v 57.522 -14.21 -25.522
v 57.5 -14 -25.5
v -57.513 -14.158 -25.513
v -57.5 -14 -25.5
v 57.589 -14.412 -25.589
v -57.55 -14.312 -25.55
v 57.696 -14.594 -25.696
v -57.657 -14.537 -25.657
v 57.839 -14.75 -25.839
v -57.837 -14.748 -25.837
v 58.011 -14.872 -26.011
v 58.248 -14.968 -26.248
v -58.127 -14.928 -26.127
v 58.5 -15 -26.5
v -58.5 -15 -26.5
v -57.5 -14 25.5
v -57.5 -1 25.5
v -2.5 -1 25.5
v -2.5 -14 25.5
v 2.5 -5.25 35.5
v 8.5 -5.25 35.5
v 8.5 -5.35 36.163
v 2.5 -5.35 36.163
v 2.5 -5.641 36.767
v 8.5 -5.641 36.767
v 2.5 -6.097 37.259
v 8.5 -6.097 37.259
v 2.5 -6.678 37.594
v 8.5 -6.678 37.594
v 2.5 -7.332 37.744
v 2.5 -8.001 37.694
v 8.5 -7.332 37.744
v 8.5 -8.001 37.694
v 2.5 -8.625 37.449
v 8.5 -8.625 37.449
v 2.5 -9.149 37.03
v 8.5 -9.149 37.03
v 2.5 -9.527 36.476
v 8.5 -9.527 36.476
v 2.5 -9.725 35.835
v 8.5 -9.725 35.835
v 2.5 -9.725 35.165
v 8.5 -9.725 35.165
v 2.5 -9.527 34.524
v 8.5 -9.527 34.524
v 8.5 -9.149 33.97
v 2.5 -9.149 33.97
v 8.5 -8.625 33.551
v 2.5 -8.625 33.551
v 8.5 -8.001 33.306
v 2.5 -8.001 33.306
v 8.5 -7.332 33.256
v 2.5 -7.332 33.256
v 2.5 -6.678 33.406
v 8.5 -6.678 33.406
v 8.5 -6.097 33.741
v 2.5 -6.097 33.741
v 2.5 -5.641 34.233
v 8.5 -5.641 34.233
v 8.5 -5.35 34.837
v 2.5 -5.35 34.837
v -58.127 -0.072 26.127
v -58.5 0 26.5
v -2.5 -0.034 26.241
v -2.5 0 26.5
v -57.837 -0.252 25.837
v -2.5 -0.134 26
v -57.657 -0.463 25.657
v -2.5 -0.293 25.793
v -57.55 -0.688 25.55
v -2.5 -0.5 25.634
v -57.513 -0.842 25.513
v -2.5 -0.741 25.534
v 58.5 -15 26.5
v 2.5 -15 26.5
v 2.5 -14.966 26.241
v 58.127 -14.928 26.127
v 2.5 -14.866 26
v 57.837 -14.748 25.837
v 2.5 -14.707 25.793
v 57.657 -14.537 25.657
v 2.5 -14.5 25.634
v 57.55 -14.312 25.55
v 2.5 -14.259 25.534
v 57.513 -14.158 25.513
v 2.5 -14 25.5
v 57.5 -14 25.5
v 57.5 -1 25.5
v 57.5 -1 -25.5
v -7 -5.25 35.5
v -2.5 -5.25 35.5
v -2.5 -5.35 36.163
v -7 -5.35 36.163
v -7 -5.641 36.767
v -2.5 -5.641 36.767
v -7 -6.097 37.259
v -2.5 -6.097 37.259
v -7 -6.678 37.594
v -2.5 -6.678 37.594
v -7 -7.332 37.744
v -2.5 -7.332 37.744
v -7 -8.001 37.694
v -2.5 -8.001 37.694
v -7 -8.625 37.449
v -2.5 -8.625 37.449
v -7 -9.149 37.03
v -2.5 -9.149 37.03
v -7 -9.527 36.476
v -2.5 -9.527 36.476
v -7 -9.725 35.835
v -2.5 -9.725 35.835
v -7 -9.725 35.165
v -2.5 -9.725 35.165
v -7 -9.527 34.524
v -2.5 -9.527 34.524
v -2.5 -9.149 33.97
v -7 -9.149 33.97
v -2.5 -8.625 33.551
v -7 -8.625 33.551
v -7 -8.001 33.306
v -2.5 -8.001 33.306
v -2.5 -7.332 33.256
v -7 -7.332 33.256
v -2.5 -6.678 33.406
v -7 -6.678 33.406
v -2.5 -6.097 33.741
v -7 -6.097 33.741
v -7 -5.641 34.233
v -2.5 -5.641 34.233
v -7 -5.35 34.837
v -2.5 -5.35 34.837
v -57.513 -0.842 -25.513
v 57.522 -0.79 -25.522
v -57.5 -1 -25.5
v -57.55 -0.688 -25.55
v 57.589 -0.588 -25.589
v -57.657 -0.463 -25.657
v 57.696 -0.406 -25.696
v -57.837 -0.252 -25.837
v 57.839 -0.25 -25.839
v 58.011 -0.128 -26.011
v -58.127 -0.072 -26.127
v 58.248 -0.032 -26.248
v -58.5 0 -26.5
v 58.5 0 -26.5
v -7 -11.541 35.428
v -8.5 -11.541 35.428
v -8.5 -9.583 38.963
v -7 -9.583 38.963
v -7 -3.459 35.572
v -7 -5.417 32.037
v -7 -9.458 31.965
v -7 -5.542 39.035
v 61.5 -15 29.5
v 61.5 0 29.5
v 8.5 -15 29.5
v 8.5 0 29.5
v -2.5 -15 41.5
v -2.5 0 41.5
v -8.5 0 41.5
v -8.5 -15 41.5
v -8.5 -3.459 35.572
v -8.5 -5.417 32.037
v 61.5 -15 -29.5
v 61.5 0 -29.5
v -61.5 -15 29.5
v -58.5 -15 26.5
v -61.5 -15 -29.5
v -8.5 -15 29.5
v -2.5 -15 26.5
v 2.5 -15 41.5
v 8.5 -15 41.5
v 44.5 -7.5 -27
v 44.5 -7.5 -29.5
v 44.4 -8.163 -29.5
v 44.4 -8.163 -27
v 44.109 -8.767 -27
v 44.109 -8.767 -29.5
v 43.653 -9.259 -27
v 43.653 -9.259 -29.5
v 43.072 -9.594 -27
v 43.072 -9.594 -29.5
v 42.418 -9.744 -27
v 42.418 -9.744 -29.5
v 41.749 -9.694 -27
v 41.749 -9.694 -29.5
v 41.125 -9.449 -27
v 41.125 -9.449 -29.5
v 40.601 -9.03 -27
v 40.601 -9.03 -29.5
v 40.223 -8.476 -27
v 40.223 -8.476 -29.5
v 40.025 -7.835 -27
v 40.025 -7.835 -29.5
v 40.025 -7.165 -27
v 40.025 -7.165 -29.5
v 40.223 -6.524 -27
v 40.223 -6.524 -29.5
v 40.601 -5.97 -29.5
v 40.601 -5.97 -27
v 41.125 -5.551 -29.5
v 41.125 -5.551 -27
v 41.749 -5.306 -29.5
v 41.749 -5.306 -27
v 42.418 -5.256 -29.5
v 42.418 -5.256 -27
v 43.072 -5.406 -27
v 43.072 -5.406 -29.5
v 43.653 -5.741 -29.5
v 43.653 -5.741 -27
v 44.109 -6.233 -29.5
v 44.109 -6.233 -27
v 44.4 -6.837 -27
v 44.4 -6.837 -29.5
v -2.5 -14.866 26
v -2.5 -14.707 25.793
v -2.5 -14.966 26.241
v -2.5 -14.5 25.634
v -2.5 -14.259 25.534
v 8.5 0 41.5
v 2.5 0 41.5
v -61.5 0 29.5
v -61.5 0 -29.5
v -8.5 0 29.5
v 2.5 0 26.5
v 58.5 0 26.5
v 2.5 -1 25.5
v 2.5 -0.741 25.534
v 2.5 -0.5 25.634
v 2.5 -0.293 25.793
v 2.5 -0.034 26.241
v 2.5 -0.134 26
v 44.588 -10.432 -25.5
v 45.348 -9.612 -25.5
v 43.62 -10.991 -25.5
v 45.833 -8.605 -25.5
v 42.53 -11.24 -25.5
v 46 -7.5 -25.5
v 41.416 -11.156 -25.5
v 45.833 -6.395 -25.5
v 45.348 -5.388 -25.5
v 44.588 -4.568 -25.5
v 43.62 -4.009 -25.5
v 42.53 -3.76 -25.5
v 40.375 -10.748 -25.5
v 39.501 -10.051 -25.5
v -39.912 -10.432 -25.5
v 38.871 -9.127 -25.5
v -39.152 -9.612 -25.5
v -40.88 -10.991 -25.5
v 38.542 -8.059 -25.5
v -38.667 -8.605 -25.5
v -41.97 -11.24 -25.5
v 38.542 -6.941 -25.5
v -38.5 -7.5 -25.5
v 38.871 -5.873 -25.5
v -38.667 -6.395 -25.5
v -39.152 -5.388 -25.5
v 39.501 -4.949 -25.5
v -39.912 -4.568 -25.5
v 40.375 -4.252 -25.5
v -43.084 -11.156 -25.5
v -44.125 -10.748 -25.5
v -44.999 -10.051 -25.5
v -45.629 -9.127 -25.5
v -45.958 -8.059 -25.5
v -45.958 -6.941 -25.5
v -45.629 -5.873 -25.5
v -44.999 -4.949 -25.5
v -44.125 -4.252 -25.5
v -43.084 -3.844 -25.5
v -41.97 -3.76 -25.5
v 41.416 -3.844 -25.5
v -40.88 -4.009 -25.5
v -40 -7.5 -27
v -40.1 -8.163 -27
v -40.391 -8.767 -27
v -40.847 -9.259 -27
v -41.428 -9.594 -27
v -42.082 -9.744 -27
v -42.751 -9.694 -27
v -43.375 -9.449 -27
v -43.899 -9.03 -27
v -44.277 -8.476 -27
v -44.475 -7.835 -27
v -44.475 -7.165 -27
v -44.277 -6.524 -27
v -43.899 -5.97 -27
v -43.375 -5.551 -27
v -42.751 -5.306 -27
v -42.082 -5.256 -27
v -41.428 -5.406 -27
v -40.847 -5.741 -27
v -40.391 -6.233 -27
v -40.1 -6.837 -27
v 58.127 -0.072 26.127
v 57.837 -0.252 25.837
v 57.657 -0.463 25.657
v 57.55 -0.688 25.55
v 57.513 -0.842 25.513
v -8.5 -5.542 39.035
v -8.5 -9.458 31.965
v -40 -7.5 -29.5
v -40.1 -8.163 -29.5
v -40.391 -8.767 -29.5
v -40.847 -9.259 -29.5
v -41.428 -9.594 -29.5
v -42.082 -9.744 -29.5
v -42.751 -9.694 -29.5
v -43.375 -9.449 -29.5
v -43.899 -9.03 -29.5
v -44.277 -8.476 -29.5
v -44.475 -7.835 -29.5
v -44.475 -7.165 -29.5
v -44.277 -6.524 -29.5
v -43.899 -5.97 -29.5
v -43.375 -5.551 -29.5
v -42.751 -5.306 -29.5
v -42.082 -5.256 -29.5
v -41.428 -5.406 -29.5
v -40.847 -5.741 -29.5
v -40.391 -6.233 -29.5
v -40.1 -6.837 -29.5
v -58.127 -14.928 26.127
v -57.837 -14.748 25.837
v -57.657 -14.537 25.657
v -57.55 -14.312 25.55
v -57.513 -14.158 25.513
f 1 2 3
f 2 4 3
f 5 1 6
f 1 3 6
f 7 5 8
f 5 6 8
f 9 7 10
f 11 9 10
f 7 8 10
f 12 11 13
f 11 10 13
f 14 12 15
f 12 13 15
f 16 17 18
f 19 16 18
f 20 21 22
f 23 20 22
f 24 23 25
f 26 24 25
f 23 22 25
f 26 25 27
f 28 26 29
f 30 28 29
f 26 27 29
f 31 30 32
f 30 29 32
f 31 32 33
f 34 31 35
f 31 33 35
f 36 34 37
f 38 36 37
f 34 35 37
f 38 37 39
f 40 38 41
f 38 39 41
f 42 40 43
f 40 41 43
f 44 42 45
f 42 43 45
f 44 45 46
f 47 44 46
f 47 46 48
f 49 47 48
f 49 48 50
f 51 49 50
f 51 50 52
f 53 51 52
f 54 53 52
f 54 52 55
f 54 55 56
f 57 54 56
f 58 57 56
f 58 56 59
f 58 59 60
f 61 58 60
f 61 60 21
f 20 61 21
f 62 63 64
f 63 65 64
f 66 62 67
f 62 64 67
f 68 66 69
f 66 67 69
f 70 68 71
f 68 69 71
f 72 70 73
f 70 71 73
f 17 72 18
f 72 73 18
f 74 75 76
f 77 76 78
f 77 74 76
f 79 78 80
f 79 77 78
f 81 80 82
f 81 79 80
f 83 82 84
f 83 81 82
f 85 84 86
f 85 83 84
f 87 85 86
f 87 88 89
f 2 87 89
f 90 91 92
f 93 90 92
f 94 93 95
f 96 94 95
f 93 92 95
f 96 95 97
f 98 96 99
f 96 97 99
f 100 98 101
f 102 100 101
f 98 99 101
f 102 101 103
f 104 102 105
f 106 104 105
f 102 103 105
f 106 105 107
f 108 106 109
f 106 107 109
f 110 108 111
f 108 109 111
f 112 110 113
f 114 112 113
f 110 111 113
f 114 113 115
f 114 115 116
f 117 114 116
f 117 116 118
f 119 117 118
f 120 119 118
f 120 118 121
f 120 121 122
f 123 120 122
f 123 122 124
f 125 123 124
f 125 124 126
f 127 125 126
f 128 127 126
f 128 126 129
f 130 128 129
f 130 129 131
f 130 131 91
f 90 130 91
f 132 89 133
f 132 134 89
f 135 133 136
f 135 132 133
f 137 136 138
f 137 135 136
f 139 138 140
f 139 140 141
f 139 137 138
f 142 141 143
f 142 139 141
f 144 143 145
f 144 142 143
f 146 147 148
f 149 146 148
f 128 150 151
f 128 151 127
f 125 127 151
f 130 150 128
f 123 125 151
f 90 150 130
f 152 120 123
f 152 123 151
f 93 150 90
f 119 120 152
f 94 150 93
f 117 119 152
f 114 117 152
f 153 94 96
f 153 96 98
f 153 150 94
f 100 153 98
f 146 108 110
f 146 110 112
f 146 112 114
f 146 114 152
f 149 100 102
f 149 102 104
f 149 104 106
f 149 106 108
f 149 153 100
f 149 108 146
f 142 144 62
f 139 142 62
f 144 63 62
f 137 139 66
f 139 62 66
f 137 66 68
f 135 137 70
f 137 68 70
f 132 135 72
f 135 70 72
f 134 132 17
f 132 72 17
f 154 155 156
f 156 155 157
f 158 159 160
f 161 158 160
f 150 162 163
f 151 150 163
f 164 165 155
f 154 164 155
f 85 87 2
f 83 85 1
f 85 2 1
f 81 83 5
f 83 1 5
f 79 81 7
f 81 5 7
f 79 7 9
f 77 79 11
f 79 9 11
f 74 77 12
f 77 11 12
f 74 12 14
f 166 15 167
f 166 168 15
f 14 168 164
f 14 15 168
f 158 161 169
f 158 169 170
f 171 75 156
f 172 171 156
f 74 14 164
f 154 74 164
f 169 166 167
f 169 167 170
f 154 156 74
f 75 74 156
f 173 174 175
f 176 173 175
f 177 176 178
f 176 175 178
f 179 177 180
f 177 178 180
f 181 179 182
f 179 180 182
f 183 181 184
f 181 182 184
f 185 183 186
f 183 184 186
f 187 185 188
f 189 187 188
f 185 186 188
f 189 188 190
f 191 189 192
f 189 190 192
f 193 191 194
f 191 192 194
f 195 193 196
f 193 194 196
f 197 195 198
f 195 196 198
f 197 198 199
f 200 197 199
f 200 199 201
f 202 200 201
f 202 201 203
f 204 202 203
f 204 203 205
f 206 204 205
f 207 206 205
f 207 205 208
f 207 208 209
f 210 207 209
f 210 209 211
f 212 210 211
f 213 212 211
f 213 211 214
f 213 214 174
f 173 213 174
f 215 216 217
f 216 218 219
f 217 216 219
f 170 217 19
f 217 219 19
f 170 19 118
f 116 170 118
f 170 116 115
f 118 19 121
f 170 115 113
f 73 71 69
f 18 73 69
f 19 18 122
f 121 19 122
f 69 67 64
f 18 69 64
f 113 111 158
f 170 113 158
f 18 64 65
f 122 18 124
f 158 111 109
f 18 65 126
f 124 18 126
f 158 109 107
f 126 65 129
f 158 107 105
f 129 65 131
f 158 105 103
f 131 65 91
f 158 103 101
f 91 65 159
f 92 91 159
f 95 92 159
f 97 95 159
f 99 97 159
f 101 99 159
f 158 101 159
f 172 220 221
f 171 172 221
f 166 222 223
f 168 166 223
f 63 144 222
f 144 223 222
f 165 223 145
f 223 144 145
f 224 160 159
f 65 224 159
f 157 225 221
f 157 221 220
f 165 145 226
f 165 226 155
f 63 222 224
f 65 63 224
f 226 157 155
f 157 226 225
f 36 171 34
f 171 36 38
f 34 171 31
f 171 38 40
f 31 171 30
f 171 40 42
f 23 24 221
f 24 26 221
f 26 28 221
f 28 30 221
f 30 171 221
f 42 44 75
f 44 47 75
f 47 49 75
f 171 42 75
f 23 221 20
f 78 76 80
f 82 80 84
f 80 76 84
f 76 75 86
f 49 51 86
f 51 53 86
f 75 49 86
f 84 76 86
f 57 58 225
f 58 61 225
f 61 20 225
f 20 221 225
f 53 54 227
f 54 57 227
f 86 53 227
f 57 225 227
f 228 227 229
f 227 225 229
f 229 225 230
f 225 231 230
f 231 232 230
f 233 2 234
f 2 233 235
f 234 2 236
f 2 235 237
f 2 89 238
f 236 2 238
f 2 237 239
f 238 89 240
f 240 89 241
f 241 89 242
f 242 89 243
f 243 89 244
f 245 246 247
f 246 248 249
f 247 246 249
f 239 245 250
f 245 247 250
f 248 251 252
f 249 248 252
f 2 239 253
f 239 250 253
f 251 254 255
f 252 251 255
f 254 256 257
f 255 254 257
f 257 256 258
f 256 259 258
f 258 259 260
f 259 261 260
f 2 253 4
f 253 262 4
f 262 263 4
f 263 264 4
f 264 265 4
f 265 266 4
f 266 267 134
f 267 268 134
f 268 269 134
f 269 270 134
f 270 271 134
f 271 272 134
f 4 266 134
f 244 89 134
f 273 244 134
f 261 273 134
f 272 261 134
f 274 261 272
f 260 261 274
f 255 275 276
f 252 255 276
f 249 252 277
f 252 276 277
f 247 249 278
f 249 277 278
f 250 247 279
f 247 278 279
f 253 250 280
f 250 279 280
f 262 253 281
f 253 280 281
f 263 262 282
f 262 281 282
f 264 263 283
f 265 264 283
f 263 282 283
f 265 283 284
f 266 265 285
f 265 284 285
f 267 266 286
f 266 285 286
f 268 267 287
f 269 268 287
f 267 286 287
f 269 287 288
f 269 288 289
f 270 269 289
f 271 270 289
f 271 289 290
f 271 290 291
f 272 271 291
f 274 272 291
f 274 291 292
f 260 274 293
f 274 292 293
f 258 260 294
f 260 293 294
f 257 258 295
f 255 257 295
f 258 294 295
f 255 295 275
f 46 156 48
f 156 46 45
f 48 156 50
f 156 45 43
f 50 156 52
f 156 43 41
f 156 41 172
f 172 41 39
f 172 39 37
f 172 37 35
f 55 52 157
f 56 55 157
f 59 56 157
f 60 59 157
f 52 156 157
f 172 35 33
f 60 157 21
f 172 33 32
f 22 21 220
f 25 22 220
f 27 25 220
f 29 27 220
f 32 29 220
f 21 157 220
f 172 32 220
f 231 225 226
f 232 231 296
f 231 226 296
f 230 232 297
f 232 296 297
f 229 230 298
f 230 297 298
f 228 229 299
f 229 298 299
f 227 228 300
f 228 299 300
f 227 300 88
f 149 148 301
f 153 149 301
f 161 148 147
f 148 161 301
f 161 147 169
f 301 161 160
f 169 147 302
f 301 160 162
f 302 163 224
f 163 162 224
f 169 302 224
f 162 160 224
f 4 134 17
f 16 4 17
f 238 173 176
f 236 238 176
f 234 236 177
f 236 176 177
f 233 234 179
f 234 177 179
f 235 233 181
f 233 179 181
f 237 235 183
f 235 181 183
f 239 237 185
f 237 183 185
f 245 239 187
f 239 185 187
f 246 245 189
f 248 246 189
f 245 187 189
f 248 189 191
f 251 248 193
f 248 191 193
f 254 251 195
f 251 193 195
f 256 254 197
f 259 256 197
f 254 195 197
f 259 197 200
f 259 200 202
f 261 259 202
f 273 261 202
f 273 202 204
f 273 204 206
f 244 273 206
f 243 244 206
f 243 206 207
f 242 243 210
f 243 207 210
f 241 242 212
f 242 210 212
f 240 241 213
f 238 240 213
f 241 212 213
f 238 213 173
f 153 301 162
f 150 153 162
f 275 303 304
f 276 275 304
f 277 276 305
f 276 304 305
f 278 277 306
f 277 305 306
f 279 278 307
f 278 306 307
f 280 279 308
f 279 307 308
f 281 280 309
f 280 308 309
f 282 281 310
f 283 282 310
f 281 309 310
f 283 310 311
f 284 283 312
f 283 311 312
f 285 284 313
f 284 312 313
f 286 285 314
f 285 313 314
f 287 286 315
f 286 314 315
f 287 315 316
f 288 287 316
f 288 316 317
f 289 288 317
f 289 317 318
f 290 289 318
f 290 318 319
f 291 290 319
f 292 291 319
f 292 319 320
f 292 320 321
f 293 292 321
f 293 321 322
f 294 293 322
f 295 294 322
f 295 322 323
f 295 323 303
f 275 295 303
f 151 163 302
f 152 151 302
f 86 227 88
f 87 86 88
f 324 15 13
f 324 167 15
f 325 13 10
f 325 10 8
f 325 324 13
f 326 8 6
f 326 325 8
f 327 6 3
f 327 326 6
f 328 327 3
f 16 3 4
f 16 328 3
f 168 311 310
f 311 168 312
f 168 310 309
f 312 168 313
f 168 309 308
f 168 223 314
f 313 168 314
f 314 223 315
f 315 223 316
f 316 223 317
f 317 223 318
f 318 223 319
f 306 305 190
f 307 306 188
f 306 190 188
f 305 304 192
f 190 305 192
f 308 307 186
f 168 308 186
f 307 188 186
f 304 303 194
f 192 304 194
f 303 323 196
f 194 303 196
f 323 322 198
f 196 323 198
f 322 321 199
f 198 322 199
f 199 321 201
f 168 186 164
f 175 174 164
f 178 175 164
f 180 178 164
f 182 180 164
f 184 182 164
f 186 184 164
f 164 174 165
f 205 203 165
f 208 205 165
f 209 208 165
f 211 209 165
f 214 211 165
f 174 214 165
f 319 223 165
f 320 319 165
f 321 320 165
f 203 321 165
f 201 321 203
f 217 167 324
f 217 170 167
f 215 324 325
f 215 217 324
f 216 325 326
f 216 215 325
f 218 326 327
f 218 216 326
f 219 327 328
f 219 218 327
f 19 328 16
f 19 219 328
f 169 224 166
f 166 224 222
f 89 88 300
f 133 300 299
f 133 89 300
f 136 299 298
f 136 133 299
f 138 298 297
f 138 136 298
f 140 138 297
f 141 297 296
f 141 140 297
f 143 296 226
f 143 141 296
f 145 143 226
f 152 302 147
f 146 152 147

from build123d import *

# Parameters (mm, degrees)
F1_DEPTH = 15
F2_R     = 2.25
F3_DEPTH = 25
F4_R     = 2.25
F5_DEPTH = 5
F6_SIZE  = 1.5
F8_DEPTH = 1.5
F9_R     = 1


with BuildPart() as f1:
    # F0 (on Front) → F1 (new body)
    with BuildSketch(Plane.XZ):
        Polygon((-57.5, -25.5), (-57.5, 25.5), (-8.5, 25.5), (-2.5, 25.5), (-2.5, 41.5), (-8.5, 41.5), (-8.5, 29.5), (-61.5, 29.5), (-61.5, -29.5), (61.5, -29.5), (61.5, 29.5), (8.5, 29.5), (8.5, 41.5), (2.5, 41.5), (2.5, 25.5), (8.5, 25.5), (57.5, 25.5), (57.5, -25.5), align=None)
    extrude(amount=F1_DEPTH)

    # F2 (on face) → F3 (cut)
    with BuildSketch(Plane.YZ.offset(8.5)):
        with Locations((-7.5, 35.5)):
            Circle(F2_R)
    extrude(amount=-F3_DEPTH, mode=Mode.SUBTRACT)

    # F4 (on face) → F5 (cut)
    with BuildSketch(Plane(origin=(0, 0, -29.5), x_dir=(1, 0, 0), z_dir=(0, 0, -1))):
        with Locations((-42.25, 7.5)):
            Circle(F4_R)
        with Locations((42.25, 7.5)):
            Circle(F4_R)
    extrude(amount=-F5_DEPTH, mode=Mode.SUBTRACT)

    # F6
    f6_edges = [f1.edges().sort_by_distance(p)[0] for p in [
        (-44.5, -7.5, -25.5),
        (40, -7.5, -25.5),
    ]]
    chamfer(f6_edges, length=F6_SIZE)

    # F7 (on face) → F8 (cut)
    with BuildSketch(Plane(origin=(-8.5, 0, 0), x_dir=(0, -1, 0), z_dir=(-1, 0, 0))):
        Polygon((9.457997, 31.964525), (11.540809, 35.427938), (9.582812, 38.963412), (5.542003, 39.035475), (3.459191, 35.572062), (5.417188, 32.036588), align=None)
    extrude(amount=-F8_DEPTH, mode=Mode.SUBTRACT)

    # F9
    f9_edges = [f1.edges().sort_by_distance(p)[0] for p in [
        (30, 0, 25.5),
        (57.5, 0, 0),
        (-30, 0, 25.5),
        (-57.5, 0, 0),
        (0, 0, -25.5),
        (-30, -15, 25.5),
        (30, -15, 25.5),
        (-57.5, -15, 0),
        (0, -15, -25.5),
        (57.5, -15, 0),
    ]]
    fillet(f9_edges, radius=F9_R)


solid = f1.part
